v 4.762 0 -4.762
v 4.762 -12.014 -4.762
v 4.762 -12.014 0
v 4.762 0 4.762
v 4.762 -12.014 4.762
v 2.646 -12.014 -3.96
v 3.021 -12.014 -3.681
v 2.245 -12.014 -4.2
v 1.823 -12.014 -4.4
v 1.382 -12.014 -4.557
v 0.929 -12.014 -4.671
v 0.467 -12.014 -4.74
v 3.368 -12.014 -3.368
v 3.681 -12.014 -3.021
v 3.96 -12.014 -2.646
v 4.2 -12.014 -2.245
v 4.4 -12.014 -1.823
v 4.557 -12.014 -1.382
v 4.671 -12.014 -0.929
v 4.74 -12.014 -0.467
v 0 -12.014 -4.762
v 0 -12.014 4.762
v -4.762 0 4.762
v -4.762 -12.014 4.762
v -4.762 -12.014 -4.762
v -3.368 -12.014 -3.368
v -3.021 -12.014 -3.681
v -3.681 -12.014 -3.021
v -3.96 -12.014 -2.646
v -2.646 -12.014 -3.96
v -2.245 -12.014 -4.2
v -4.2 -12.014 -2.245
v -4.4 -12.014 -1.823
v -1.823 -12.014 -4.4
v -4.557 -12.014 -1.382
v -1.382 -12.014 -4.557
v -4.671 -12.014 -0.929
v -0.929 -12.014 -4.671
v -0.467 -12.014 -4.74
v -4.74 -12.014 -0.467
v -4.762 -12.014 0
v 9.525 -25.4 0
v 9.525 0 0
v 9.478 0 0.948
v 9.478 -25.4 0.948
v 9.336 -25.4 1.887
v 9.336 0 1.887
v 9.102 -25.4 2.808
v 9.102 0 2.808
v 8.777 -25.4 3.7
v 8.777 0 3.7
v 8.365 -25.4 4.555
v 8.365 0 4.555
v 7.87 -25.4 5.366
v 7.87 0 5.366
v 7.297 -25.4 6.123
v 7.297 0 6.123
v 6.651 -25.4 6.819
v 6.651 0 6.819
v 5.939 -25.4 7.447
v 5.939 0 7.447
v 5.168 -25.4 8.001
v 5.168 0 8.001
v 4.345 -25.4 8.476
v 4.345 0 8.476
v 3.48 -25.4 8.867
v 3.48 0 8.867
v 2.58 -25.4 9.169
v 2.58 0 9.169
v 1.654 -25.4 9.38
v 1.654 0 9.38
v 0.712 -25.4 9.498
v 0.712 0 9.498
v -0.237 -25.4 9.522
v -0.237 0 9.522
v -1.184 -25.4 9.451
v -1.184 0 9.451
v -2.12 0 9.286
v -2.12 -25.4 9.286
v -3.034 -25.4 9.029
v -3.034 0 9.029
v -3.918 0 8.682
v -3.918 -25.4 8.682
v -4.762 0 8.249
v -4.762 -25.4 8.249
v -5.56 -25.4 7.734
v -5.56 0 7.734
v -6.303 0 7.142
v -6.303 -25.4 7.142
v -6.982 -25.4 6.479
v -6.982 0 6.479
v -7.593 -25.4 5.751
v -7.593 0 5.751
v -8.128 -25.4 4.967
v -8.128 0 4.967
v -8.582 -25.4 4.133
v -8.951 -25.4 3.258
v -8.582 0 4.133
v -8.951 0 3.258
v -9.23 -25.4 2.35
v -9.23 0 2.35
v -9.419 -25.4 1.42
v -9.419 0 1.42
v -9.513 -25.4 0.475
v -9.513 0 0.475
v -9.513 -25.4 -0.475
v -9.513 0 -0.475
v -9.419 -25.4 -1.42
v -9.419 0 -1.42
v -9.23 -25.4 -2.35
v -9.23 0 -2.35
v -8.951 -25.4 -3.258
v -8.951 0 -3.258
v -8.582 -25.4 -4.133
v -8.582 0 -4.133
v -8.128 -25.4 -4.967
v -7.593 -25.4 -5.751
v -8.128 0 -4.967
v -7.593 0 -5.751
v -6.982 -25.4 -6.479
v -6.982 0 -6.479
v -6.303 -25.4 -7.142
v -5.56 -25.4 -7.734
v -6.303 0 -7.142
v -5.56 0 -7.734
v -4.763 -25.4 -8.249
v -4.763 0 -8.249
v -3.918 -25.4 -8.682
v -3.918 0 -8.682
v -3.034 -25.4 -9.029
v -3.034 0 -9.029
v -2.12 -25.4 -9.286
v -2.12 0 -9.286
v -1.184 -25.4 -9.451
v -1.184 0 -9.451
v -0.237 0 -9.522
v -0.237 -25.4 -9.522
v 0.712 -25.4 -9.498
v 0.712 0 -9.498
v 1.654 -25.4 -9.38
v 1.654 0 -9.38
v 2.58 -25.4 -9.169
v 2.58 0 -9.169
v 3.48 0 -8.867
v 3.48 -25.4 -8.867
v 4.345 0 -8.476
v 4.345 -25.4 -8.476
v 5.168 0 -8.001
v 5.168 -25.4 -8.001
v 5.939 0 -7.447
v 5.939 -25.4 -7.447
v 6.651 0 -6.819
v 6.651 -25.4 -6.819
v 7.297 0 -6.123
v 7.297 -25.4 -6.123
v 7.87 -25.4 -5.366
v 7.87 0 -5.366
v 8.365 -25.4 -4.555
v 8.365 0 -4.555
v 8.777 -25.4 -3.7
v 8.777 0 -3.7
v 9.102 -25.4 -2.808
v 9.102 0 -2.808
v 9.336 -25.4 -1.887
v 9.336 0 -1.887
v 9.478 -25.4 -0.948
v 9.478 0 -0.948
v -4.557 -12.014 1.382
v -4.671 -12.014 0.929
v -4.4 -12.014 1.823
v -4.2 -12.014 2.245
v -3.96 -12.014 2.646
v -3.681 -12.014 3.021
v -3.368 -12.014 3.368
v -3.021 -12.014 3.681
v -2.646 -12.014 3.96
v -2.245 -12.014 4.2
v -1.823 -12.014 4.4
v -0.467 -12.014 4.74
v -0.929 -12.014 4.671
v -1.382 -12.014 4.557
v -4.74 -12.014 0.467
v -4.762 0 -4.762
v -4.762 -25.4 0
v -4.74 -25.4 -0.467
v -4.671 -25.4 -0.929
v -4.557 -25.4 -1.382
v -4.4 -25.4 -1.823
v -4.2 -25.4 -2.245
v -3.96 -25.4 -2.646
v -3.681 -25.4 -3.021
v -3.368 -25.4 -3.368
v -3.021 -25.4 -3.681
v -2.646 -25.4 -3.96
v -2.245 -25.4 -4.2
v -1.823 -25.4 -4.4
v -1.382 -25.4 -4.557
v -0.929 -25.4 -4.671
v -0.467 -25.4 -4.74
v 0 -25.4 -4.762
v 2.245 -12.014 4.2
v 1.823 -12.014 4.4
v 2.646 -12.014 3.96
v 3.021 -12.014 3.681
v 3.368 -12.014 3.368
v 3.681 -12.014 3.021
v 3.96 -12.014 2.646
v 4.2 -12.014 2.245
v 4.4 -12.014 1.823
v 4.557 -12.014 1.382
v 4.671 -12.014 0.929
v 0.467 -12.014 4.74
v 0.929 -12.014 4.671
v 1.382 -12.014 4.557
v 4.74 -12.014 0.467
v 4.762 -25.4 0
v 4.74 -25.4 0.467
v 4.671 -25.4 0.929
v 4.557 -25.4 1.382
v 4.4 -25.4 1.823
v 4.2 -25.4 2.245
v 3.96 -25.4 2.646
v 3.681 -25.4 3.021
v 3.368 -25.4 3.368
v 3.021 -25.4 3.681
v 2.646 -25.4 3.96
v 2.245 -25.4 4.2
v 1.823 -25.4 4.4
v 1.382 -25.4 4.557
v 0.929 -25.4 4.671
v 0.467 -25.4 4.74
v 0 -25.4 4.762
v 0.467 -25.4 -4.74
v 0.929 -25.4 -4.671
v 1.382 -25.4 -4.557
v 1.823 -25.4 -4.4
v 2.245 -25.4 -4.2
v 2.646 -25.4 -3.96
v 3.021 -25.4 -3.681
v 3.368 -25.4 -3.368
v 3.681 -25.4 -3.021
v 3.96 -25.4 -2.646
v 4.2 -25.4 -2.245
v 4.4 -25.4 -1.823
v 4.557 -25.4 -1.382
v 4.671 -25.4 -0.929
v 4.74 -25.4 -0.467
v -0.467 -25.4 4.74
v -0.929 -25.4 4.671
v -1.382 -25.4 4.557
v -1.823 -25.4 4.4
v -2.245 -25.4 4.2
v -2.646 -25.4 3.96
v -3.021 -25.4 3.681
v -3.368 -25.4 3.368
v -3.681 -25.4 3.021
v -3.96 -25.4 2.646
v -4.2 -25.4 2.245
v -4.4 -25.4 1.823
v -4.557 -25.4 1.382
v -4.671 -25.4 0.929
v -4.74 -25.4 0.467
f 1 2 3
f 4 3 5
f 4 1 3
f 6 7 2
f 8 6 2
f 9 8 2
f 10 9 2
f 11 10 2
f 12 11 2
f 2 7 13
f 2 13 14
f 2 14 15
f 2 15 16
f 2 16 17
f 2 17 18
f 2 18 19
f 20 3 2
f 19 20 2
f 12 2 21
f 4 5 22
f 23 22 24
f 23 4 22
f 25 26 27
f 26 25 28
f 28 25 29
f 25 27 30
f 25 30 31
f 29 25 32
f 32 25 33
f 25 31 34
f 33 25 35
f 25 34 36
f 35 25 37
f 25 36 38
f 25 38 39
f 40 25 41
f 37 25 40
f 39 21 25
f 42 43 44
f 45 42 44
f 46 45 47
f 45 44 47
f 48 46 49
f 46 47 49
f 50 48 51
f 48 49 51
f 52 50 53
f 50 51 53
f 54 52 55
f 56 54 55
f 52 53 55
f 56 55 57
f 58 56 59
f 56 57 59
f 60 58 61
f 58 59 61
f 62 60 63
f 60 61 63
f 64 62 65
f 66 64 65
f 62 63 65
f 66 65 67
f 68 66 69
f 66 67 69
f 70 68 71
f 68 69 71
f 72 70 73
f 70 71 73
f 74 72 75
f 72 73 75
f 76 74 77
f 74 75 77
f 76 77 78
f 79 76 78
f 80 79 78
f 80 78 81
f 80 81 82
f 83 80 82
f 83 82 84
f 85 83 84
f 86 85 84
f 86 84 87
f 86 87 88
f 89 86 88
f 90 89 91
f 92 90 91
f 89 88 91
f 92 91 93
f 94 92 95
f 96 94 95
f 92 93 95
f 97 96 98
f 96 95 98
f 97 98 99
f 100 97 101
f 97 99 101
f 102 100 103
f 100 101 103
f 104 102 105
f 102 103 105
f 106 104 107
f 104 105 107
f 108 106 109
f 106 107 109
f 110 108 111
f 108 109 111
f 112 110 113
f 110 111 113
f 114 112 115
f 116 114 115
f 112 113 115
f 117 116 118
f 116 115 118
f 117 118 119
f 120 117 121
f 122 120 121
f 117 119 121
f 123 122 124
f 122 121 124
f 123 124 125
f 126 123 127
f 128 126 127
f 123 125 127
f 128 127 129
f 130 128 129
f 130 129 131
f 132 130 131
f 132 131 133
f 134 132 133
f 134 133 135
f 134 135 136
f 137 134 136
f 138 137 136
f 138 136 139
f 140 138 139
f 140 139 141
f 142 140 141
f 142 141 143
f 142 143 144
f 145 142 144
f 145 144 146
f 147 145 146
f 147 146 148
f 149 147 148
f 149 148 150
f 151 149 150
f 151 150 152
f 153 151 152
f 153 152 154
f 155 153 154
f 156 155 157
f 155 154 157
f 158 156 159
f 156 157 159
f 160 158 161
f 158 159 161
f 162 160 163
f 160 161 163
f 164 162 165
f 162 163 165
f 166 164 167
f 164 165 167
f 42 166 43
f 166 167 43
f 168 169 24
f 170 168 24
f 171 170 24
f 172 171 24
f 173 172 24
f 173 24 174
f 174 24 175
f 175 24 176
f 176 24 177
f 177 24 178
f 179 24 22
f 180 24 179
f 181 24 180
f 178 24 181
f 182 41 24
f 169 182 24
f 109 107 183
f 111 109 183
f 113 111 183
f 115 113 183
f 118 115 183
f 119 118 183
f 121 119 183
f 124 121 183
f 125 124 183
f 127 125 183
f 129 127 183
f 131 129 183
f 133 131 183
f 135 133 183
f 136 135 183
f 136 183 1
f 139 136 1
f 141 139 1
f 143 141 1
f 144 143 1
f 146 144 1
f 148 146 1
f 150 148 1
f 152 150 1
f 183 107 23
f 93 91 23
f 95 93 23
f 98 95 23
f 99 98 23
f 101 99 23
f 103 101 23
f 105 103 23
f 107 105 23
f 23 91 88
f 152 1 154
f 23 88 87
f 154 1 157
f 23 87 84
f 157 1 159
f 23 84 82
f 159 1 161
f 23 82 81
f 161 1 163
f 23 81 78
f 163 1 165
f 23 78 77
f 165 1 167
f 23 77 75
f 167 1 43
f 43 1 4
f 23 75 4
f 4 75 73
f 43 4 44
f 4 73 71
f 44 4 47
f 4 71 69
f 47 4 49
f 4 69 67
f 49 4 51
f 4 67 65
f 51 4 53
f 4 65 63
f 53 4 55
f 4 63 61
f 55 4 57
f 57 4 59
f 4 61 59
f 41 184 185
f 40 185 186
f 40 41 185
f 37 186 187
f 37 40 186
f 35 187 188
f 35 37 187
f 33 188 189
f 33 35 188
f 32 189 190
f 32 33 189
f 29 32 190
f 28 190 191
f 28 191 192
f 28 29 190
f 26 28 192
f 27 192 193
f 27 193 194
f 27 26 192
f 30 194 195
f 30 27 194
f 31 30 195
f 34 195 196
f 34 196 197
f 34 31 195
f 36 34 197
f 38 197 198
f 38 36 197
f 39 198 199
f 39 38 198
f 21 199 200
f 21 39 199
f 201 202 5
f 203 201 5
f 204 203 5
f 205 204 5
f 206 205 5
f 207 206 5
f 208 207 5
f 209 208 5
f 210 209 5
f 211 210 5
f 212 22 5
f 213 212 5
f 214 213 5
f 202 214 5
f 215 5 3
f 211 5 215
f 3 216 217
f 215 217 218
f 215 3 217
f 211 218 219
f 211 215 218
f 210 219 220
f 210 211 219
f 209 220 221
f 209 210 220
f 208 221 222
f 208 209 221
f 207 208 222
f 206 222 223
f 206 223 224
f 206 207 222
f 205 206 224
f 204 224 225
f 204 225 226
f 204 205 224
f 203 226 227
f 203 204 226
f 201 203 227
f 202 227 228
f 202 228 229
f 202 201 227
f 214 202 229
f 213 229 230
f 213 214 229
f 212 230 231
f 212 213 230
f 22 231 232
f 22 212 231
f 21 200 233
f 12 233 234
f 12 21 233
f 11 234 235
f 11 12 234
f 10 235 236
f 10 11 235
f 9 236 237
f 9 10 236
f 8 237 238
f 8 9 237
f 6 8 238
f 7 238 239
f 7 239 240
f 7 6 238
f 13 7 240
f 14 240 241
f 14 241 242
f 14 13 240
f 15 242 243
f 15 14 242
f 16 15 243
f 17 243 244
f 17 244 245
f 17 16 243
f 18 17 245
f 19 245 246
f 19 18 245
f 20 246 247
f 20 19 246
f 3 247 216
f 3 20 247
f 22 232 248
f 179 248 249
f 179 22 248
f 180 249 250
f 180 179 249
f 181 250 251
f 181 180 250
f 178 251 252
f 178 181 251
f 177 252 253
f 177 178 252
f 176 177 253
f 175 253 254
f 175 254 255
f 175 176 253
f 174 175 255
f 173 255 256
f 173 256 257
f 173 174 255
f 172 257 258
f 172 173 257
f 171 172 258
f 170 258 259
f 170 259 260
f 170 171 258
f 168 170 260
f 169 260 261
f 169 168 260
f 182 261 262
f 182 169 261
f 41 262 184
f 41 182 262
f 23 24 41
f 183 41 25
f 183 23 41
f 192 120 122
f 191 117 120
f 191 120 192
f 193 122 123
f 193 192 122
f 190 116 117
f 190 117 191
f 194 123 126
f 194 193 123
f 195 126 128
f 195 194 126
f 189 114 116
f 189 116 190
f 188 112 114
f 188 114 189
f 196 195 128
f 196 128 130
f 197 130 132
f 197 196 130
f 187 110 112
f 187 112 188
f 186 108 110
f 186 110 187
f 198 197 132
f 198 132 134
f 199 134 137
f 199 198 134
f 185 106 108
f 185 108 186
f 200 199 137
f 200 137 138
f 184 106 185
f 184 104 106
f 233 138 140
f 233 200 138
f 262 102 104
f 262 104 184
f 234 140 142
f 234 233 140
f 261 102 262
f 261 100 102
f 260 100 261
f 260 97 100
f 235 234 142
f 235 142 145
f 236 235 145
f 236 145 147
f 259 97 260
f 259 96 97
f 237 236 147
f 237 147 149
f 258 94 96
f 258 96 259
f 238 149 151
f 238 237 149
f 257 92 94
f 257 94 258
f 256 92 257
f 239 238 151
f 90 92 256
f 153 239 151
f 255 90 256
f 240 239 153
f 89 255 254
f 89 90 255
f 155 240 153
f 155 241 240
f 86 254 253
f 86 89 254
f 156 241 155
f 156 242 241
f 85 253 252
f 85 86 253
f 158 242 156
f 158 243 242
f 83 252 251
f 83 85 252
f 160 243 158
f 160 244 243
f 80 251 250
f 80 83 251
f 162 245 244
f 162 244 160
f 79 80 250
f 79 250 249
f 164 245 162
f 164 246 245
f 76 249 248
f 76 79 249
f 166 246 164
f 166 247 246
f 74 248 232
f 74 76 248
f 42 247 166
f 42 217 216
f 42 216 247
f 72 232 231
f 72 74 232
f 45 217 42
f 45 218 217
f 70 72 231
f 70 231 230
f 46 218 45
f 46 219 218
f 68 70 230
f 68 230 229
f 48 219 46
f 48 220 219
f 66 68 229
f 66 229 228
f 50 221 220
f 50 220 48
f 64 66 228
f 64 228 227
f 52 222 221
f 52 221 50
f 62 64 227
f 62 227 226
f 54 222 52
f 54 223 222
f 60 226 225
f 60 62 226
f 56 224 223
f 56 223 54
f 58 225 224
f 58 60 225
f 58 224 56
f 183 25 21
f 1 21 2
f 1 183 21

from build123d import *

# Parameters (mm, degrees)
F0_R     = 9.525
F1_DEPTH = 25.4
F2_DEPTH = 25.4
F3_DEPTH = 12.0142


with BuildPart() as f1:
    # F0 (on Front) → F1 (new body)
    with BuildSketch(Plane.XZ):
        Circle(F0_R)
        Polygon((-4.7625, 0), (-4.7625, 4.7625), (0, 4.7625), (4.7625, 4.7625), (4.7625, 0), (4.7625, -4.7625), (0, -4.7625), (-4.7625, -4.7625), align=None, mode=Mode.SUBTRACT)
        with BuildLine():
            Line((4.7625, 4.7625), (0, 4.7625))
            ThreePointArc((0, 4.7625), (3.367596, 3.367596), (4.7625, 0))
            Line((4.7625, 0), (4.7625, 4.7625))
        make_face()
        with BuildLine():
            ThreePointArc((4.7625, 0), (3.367596, 3.367596), (0, 4.7625))
            ThreePointArc((0, 4.7625), (-3.367596, 3.367596), (-4.7625, 0))
            ThreePointArc((-4.7625, 0), (-3.367596, -3.367596), (0, -4.7625))
            ThreePointArc((0, -4.7625), (3.367596, -3.367596), (4.7625, 0))
        make_face()
        with BuildLine():
            ThreePointArc((0, -4.7625), (-3.367596, -3.367596), (-4.7625, 0))
            Line((-4.7625, 0), (-4.7625, -4.7625))
            Line((-4.7625, -4.7625), (0, -4.7625))
        make_face()
        with BuildLine():
            Line((4.7625, -4.7625), (4.7625, 0))
            ThreePointArc((4.7625, 0), (3.367596, -3.367596), (0, -4.7625))
            Line((0, -4.7625), (4.7625, -4.7625))
        make_face()
        with BuildLine():
            Line((0, 4.7625), (-4.7625, 4.7625))
            Line((-4.7625, 4.7625), (-4.7625, 0))
            ThreePointArc((-4.7625, 0), (-3.367596, 3.367596), (0, 4.7625))
        make_face()
    extrude(amount=F1_DEPTH)

    # F0 (on Front) → F2 (cut)
    with BuildSketch(Plane.XZ):
        with BuildLine():
            ThreePointArc((4.7625, 0), (3.367596, 3.367596), (0, 4.7625))
            ThreePointArc((0, 4.7625), (-3.367596, 3.367596), (-4.7625, 0))
            ThreePointArc((-4.7625, 0), (-3.367596, -3.367596), (0, -4.7625))
            ThreePointArc((0, -4.7625), (3.367596, -3.367596), (4.7625, 0))
        make_face()
    extrude(amount=F2_DEPTH, mode=Mode.SUBTRACT)

    # F0 (on Front) → F3 (cut)
    with BuildSketch(Plane.XZ):
        with BuildLine():
            ThreePointArc((0, -4.7625), (-3.367596, -3.367596), (-4.7625, 0))
            Line((-4.7625, 0), (-4.7625, -4.7625))
            Line((-4.7625, -4.7625), (0, -4.7625))
        make_face()
        with BuildLine():
            Line((4.7625, -4.7625), (4.7625, 0))
            ThreePointArc((4.7625, 0), (3.367596, -3.367596), (0, -4.7625))
            Line((0, -4.7625), (4.7625, -4.7625))
        make_face()
        with BuildLine():
            Line((0, 4.7625), (-4.7625, 4.7625))
            Line((-4.7625, 4.7625), (-4.7625, 0))
            ThreePointArc((-4.7625, 0), (-3.367596, 3.367596), (0, 4.7625))
        make_face()
        with BuildLine():
            Line((4.7625, 4.7625), (0, 4.7625))
            ThreePointArc((0, 4.7625), (3.367596, 3.367596), (4.7625, 0))
            Line((4.7625, 0), (4.7625, 4.7625))
        make_face()
    extrude(amount=F3_DEPTH, mode=Mode.SUBTRACT)


solid = f1.part
